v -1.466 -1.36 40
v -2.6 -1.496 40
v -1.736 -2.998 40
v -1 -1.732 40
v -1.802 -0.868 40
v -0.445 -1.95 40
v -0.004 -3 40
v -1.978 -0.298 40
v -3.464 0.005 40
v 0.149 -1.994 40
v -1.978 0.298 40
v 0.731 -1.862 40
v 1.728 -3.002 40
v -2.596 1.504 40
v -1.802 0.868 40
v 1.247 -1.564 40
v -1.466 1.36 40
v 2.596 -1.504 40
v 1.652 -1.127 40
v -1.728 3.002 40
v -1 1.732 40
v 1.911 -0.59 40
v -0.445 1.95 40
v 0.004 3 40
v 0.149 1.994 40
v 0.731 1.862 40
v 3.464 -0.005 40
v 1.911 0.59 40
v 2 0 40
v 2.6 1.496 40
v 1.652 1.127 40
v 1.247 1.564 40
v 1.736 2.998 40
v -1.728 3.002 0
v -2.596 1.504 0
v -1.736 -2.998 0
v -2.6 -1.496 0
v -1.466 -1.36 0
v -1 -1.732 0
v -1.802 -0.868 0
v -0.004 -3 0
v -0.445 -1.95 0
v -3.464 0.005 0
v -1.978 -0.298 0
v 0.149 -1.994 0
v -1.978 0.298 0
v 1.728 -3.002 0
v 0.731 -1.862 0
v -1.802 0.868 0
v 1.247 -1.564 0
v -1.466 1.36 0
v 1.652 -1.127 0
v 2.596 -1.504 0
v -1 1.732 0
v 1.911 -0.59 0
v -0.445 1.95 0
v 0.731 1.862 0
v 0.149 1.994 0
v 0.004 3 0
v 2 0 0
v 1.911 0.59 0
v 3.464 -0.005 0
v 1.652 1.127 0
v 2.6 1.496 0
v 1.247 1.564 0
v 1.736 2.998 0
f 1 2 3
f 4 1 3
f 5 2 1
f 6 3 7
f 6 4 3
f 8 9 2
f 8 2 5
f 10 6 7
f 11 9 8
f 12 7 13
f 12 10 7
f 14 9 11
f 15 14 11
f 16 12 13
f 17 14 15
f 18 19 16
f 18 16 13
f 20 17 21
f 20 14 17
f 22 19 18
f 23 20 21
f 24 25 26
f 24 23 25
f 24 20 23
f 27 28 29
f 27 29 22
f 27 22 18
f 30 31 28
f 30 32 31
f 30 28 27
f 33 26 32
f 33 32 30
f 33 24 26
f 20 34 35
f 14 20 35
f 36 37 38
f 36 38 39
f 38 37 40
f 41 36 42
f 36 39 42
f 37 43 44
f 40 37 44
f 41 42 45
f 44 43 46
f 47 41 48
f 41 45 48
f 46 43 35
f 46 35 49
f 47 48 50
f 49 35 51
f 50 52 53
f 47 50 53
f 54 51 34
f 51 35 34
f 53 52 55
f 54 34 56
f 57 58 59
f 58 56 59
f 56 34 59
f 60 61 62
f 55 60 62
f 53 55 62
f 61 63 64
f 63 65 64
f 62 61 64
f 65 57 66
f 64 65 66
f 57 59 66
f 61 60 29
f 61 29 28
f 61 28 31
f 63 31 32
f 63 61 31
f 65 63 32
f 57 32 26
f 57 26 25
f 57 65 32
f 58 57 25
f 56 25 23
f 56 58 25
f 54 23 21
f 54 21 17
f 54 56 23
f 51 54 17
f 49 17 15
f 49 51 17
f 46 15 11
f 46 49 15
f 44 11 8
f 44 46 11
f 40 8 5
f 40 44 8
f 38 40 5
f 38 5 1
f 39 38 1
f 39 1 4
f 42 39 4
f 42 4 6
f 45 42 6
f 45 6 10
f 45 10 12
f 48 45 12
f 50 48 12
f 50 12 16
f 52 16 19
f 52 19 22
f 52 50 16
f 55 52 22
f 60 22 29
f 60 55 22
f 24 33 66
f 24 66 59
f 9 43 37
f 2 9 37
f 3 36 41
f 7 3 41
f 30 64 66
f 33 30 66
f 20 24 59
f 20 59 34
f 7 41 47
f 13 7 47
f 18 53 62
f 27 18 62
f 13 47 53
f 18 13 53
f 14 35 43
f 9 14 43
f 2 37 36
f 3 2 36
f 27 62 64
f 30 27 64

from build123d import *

# Parameters (mm, degrees)
SKETCH2_R           = 3
SKETCH2_R_2         = 2
BOSS_EXTRUDE1_DEPTH = 40


with BuildPart() as part:
    # Sketch2 → Boss-Extrude1 (new body)
    # profile 1 of 7: a face of its own
    with BuildSketch(Plane.XY):
        Circle(SKETCH2_R)
        Circle(SKETCH2_R_2, mode=Mode.SUBTRACT)
    # profile 2 of 7: a face of its own
    with BuildSketch(Plane.XY):
        with BuildLine():
            Line((0.00424563, 2.999996996), (-1.7278037, 3.002448064))
            Line((-1.7278037, 3.002448064), (-2.595950792, 1.503675326))
            ThreePointArc((-2.595950792, 1.503675326), (-1.496321672, 2.600196426), (0.00424563, 2.999996996))
        make_face()
    # profile 3 of 7: a face of its own
    with BuildSketch(Plane.XY):
        with BuildLine():
            Line((1.736294447, 2.997545929), (0.00424563, 2.999996996))
            ThreePointArc((0.00424563, 2.999996996), (1.503675324, 2.595950793), (2.600196428, 1.496321669))
            Line((2.600196428, 1.496321669), (1.736294447, 2.997545929))
        make_face()
    # profile 4 of 7: a face of its own
    with BuildSketch(Plane.XY):
        with BuildLine():
            Line((3.464098147, -0.004902135), (2.600196428, 1.496321669))
            ThreePointArc((2.600196428, 1.496321669), (2.898326179, 0.774406456), (3, 0))
            ThreePointArc((3, 0), (2.897227326, -0.778507431), (2.595950787, -1.503675335))
            Line((2.595950787, -1.503675335), (3.464098147, -0.004902135))
        make_face()
    # profile 5 of 7: a face of its own
    with BuildSketch(Plane.XY):
        with BuildLine():
            ThreePointArc((2.595950787, -1.503675335), (1.496321666, -2.60019643), (-0.004245634, -2.999996996))
            Line((-0.004245634, -2.999996996), (1.7278037, -3.002448064))
            Line((1.7278037, -3.002448064), (2.595950787, -1.503675335))
        make_face()
    # profile 6 of 7: a face of its own
    with BuildSketch(Plane.XY):
        with BuildLine():
            ThreePointArc((-0.004245634, -2.999996996), (-1.503675323, -2.595950794), (-2.600196425, -1.496321674))
            Line((-2.600196425, -1.496321674), (-1.736294447, -2.997545929))
            Line((-1.736294447, -2.997545929), (-0.004245634, -2.999996996))
        make_face()
    # profile 7 of 7: a face of its own
    with BuildSketch(Plane.XY):
        with BuildLine():
            ThreePointArc((-2.600196425, -1.496321674), (-2.999996996, 0.004245633), (-2.595950792, 1.503675326))
            Line((-2.595950792, 1.503675326), (-3.464098147, 0.004902135))
            Line((-3.464098147, 0.004902135), (-2.600196425, -1.496321674))
        make_face()
    extrude(amount=BOSS_EXTRUDE1_DEPTH)


solid = part.part
